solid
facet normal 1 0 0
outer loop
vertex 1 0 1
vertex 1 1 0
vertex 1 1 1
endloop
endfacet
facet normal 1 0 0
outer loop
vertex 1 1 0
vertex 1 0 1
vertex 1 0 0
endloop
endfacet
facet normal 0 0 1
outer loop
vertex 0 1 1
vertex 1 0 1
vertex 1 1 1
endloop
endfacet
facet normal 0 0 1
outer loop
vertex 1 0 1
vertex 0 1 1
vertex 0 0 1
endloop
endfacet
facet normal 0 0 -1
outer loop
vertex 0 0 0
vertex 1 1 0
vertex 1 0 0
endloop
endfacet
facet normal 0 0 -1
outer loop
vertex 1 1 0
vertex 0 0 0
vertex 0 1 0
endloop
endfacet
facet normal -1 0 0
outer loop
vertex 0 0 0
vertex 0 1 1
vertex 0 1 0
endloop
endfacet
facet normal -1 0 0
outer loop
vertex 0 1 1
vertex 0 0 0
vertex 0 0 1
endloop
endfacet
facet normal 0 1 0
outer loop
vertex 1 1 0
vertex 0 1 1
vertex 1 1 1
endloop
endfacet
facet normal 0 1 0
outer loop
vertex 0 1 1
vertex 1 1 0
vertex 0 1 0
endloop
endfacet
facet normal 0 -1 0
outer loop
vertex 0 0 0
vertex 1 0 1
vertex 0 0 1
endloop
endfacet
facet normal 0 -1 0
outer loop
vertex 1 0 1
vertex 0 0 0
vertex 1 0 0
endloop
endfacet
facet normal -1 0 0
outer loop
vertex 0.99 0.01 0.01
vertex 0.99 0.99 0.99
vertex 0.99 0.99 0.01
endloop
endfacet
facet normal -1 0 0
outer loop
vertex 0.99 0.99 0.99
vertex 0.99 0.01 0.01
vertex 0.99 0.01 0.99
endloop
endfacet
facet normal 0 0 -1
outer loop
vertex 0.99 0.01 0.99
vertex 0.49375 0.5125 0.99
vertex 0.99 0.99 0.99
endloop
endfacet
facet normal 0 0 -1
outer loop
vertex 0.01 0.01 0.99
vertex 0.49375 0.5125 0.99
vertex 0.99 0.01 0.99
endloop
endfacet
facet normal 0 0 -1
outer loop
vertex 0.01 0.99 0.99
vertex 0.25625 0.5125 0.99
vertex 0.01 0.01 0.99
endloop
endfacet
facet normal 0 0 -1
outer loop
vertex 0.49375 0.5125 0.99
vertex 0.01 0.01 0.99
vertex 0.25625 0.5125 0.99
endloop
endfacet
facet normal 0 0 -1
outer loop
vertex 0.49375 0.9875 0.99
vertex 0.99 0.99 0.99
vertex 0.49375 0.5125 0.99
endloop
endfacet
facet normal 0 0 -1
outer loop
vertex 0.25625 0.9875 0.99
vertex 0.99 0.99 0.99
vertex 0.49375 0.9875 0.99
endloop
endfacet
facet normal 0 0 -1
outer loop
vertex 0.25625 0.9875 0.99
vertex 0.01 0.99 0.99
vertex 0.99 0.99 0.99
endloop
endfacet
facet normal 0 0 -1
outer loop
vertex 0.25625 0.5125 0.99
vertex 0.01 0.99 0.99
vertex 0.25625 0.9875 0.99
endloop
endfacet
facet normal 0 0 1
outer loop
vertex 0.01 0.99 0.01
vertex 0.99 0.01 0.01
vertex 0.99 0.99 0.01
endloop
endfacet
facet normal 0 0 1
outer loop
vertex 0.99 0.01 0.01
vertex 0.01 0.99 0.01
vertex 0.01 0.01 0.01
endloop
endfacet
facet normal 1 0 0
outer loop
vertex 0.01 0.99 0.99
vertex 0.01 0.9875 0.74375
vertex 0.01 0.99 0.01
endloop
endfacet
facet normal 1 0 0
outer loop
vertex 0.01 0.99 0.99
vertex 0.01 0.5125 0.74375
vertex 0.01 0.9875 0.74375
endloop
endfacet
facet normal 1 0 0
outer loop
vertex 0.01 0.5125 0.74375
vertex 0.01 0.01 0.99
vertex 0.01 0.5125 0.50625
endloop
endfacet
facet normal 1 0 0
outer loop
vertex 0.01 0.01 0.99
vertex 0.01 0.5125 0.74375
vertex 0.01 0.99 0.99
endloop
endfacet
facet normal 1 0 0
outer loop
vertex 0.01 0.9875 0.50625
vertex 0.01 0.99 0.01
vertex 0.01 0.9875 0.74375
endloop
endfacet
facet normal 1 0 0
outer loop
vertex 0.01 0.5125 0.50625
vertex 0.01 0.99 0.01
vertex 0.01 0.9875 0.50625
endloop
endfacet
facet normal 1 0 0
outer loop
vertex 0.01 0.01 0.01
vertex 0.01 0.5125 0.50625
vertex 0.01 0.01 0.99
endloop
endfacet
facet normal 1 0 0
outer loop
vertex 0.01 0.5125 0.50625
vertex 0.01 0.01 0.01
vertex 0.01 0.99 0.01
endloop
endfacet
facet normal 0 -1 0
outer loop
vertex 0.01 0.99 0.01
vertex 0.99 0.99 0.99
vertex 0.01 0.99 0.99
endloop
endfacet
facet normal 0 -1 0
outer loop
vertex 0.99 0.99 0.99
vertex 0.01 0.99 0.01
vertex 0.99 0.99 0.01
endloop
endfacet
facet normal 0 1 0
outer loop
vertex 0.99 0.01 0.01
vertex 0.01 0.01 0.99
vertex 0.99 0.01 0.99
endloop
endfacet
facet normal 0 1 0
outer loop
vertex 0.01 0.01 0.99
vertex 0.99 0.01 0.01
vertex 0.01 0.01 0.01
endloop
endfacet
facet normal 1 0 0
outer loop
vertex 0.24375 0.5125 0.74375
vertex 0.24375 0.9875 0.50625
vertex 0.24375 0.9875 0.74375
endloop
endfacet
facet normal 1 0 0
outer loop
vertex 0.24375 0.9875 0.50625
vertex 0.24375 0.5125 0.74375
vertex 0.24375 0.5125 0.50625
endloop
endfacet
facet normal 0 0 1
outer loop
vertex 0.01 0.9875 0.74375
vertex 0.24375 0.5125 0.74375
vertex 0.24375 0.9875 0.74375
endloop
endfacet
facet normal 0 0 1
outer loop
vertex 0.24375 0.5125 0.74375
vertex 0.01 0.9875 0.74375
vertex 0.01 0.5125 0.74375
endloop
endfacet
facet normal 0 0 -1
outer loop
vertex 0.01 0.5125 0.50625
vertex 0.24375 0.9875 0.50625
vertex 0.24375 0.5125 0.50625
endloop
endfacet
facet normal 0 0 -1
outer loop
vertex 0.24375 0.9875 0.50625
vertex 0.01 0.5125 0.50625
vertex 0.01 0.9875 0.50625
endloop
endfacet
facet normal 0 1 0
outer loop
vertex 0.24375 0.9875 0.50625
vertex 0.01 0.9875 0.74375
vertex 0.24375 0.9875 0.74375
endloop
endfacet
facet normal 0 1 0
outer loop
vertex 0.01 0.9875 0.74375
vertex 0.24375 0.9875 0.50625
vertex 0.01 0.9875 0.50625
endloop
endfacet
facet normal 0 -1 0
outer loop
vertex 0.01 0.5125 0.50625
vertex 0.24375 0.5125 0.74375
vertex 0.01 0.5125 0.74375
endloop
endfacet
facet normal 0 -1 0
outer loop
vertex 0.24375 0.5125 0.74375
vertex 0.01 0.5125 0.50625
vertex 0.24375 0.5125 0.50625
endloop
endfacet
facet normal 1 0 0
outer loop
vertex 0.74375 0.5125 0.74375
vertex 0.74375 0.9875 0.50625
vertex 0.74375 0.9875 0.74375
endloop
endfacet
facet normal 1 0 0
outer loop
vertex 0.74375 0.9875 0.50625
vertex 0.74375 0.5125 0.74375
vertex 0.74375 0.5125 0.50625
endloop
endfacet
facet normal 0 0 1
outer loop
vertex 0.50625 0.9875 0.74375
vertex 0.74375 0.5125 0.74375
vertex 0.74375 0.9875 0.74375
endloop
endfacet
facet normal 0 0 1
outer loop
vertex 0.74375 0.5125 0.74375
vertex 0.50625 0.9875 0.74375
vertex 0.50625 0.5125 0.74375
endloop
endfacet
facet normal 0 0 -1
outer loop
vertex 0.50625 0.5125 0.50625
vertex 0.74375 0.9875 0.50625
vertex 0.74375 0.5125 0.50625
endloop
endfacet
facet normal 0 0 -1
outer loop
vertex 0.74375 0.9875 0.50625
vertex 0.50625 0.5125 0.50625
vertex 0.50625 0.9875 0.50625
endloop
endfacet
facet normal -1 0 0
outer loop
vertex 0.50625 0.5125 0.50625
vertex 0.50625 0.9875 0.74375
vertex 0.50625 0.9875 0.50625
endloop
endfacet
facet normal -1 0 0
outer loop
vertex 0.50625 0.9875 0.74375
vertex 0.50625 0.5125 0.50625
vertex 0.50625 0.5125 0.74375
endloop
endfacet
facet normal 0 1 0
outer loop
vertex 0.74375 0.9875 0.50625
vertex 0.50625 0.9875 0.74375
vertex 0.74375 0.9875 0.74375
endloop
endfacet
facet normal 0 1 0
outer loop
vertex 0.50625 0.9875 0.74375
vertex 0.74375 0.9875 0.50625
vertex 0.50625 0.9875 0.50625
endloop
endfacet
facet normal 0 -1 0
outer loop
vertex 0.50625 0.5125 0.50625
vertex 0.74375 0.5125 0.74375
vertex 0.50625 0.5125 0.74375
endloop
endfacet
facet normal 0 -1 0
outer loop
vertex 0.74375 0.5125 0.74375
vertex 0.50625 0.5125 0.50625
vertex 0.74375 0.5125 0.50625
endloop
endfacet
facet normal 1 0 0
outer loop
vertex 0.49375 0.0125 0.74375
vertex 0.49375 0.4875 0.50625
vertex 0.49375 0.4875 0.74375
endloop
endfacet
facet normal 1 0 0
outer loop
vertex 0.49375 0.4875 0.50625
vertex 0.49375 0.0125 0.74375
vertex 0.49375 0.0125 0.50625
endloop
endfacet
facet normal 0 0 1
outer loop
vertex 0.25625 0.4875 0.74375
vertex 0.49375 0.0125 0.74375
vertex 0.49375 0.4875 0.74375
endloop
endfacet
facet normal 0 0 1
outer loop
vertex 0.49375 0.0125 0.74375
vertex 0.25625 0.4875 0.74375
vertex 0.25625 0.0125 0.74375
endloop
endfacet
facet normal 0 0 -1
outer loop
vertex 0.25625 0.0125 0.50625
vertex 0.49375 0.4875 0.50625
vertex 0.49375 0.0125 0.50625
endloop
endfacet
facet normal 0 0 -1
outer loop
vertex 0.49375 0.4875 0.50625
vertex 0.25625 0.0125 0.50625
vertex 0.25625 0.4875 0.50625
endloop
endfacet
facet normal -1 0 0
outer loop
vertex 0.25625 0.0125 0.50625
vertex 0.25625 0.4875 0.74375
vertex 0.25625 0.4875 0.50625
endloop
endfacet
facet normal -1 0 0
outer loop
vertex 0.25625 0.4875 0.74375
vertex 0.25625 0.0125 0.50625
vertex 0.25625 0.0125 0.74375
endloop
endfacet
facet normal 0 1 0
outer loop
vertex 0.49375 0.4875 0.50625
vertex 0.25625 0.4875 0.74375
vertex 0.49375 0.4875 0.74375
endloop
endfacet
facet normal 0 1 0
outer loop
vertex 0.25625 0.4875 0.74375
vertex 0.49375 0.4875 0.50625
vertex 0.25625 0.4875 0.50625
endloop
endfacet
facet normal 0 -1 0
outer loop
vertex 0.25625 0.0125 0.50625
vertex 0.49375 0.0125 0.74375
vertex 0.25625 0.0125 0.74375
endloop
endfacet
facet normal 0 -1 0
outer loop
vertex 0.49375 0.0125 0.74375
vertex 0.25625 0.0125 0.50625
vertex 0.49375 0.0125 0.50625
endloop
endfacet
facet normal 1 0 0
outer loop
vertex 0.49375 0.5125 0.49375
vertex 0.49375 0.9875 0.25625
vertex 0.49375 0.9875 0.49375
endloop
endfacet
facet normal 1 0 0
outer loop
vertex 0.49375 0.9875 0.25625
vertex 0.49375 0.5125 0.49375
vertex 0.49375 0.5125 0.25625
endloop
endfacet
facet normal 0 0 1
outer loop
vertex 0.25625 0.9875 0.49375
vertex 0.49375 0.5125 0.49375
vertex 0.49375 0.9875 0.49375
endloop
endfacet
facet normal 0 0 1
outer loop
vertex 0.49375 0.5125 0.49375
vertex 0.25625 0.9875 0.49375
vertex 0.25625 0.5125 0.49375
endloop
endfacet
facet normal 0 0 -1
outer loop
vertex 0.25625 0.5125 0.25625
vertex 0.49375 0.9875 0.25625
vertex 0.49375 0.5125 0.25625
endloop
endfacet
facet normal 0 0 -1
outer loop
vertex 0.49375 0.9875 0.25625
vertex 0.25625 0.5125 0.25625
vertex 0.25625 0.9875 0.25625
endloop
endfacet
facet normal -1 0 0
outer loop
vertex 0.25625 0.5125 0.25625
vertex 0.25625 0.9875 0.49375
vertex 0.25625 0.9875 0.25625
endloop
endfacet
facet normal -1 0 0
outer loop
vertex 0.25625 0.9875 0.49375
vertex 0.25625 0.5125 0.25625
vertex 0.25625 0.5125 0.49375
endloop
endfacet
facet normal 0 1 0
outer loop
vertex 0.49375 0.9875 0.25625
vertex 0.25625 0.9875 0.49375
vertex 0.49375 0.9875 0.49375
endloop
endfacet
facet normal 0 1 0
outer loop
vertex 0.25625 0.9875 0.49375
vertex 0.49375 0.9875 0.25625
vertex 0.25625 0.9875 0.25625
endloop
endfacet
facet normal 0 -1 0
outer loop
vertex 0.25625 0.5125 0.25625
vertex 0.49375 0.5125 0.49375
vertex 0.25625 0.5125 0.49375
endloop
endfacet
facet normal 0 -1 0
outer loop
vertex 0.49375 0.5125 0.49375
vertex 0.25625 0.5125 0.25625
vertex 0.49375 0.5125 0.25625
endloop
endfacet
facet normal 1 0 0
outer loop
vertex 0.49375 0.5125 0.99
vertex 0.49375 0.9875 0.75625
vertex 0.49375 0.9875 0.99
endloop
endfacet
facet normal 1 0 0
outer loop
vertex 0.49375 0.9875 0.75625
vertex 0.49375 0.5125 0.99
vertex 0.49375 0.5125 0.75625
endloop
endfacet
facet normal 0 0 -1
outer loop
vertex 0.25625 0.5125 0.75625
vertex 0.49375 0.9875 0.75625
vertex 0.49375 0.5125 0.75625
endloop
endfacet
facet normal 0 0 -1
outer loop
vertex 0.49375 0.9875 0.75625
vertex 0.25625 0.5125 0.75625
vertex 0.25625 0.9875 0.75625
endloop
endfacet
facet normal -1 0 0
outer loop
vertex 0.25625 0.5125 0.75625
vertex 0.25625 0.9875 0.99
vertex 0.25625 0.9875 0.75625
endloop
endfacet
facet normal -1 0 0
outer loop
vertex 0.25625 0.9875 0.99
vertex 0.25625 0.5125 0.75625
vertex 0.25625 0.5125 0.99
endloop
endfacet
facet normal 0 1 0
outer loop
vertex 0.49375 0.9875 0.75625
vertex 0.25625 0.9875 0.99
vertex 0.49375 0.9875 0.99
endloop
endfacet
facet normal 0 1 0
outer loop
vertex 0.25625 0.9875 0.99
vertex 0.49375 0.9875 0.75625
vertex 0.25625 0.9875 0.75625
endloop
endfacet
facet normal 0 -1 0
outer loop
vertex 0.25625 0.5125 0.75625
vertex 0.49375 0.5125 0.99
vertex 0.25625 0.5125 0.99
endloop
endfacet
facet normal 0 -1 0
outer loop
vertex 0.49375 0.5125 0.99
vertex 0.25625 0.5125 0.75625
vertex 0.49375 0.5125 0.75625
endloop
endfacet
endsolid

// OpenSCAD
translate([0.125, 0.75, 0.625]) color([0.7305892977478141, 0.10392415719854187, 0.08826484997882134]) cube([0.2375, 0.475, 0.2375], center=true);
translate([0.625, 0.75, 0.625]) color([0.3417687114400708, 0.03527522146440143, 0.25254475869300597]) cube([0.2375, 0.475, 0.2375], center=true);
translate([0.375, 0.25, 0.625]) color([0.7394935189779719, 0.8655911651110135, 0.6969416896970619]) cube([0.2375, 0.475, 0.2375], center=true);
translate([0.375, 0.75, 0.375]) color([0.3526130292594223, 0.8691323696171844, 0.2020132852309806]) cube([0.2375, 0.475, 0.2375], center=true);
translate([0.375, 0.75, 0.875]) color([0.9689052850282494, 0.341937751645613, 0.31095971721102034]) cube([0.2375, 0.475, 0.2375], center=true);
color([0.3,0.3,0.3,0.3]) difference() { cube([1,1,1]); translate([0.01,0.01,0.01]) cube([0.98,0.98,0.98]); }
